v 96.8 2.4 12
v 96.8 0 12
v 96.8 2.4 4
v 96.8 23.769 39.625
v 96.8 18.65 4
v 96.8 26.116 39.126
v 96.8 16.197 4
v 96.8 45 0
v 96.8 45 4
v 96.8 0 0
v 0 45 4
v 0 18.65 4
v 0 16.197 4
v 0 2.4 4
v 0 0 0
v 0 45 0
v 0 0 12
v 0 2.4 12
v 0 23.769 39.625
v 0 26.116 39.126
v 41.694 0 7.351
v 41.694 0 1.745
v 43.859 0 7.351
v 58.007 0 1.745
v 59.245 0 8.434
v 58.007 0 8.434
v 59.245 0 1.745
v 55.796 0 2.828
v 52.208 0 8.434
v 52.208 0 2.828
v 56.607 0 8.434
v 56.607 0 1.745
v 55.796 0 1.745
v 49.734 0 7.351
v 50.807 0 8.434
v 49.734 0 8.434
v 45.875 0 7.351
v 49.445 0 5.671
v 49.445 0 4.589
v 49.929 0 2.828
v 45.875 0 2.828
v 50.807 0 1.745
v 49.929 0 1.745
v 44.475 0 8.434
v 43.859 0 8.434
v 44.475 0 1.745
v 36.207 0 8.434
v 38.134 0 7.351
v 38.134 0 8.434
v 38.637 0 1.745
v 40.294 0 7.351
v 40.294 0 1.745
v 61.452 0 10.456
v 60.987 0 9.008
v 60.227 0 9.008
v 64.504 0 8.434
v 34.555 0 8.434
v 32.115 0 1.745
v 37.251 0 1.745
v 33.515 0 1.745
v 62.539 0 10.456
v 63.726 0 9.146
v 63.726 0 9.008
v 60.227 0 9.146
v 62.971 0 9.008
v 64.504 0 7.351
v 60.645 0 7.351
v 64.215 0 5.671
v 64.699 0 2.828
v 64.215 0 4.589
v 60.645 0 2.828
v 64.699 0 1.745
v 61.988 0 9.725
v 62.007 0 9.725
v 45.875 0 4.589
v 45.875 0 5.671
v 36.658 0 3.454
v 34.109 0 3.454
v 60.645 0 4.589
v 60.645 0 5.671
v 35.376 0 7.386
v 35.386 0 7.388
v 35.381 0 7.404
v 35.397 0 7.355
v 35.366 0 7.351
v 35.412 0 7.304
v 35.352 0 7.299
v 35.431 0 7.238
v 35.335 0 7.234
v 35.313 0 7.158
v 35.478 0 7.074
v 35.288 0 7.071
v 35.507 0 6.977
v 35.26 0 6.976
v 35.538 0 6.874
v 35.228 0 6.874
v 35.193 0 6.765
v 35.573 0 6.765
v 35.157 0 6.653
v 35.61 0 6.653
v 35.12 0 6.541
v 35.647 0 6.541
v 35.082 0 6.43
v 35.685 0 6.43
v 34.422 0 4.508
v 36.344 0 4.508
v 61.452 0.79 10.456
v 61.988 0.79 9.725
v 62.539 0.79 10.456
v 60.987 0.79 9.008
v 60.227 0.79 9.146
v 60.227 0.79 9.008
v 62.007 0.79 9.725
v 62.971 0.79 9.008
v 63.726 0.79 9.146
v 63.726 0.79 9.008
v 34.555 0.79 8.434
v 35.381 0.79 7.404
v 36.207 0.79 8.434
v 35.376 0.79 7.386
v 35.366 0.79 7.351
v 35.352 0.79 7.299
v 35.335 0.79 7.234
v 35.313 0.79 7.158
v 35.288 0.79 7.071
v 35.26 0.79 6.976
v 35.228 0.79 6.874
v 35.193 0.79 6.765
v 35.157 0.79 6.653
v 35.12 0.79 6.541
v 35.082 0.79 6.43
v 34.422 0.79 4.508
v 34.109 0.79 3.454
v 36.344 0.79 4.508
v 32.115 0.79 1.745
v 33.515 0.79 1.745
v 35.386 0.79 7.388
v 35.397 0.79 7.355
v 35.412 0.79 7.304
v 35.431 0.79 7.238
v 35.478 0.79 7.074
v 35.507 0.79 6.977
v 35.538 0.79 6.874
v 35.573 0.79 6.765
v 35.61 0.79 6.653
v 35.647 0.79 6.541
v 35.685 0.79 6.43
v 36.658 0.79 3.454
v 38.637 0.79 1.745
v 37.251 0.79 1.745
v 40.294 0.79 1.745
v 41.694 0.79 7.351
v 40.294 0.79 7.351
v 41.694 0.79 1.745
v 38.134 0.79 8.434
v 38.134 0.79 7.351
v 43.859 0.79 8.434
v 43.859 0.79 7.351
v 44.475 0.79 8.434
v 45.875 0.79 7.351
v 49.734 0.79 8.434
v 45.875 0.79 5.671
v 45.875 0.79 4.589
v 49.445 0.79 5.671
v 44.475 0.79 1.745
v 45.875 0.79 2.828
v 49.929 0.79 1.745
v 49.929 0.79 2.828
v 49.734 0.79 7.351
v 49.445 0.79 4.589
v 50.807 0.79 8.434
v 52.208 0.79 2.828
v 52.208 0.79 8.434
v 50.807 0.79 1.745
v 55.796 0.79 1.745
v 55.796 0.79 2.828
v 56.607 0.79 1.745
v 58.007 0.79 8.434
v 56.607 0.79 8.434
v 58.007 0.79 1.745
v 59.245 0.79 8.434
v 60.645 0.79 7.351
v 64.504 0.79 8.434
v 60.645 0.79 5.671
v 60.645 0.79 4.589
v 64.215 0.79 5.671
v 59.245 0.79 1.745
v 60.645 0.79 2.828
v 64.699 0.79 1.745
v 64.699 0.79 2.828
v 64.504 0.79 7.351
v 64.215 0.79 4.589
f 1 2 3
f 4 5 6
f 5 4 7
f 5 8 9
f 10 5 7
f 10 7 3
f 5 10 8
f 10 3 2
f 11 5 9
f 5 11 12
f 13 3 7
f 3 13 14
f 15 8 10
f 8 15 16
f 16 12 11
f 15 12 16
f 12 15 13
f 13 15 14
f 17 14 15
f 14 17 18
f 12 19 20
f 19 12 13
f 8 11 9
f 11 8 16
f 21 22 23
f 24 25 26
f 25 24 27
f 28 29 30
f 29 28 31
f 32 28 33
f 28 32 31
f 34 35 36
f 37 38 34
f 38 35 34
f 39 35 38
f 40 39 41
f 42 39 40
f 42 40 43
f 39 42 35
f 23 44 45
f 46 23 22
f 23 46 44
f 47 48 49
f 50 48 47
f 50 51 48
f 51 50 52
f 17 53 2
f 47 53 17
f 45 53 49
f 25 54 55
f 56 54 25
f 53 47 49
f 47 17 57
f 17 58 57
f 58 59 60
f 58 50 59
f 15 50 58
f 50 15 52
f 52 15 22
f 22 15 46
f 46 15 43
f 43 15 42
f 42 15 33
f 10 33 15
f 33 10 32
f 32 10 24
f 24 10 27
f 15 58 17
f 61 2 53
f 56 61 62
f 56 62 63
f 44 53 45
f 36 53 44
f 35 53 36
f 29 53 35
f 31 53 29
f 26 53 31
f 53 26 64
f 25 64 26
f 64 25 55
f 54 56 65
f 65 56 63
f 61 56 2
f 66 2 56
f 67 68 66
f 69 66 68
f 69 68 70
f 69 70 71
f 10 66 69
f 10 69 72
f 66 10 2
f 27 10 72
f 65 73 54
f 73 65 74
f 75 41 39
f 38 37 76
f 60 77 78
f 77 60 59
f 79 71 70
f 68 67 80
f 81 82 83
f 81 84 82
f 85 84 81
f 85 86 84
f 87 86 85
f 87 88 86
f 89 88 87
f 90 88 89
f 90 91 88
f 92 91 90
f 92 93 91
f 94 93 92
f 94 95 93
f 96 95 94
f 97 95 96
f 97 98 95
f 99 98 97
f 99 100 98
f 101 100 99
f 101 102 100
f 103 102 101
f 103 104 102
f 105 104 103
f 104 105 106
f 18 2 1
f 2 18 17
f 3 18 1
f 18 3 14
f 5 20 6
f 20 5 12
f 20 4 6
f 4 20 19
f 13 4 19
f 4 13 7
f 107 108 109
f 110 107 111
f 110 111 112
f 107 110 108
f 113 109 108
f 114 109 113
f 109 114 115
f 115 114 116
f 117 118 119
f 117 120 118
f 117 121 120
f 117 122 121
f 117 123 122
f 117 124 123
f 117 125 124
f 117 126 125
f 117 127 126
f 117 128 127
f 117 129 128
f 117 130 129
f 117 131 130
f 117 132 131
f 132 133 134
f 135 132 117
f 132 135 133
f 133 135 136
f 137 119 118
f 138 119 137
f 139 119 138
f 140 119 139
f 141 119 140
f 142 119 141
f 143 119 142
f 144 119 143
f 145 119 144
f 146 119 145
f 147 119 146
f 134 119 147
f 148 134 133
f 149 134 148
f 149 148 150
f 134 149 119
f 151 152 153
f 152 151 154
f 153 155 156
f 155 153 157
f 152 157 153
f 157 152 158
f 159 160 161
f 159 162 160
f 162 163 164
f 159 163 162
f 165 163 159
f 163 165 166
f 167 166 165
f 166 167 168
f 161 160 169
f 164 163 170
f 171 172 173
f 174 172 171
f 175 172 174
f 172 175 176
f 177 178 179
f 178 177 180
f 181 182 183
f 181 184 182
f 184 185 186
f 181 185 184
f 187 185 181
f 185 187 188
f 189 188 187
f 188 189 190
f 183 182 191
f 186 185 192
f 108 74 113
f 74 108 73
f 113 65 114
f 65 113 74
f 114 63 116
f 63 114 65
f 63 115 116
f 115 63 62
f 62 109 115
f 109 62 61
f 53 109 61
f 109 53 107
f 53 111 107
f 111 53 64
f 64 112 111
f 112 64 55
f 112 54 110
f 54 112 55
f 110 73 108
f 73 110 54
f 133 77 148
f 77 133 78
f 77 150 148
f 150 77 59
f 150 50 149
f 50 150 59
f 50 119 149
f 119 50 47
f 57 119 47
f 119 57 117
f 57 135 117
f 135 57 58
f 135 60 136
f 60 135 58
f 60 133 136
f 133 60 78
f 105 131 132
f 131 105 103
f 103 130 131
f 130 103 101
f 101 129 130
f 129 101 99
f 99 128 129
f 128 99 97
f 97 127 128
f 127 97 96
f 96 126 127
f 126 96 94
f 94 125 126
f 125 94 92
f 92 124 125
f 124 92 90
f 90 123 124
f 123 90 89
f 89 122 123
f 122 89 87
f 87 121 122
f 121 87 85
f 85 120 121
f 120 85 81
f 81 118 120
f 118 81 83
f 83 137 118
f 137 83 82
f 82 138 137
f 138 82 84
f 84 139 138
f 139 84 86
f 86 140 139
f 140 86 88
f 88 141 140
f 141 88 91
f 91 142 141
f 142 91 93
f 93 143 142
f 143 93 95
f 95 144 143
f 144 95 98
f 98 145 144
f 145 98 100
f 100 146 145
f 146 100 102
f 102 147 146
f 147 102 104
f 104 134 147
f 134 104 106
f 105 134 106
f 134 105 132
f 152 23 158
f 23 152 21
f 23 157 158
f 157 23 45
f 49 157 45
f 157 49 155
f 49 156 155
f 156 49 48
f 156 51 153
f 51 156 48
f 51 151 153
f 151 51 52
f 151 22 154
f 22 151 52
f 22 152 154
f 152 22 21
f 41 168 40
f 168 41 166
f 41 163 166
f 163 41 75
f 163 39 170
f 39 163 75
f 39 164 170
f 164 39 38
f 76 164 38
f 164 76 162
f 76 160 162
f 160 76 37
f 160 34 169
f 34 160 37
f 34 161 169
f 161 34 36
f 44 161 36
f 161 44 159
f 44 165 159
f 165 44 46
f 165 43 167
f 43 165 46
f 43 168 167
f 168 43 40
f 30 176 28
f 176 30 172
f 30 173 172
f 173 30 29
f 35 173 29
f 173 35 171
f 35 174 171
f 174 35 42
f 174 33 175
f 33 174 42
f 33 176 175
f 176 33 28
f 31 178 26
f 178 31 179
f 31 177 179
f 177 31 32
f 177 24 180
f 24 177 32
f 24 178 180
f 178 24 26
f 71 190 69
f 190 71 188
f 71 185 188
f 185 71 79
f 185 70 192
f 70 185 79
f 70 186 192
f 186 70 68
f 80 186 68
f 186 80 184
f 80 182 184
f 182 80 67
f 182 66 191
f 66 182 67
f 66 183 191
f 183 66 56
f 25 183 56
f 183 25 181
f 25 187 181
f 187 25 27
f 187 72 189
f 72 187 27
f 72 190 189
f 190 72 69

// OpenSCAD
// Porta-cartão de mesa - impressão 3D
card_w = 90;         // largura do cartão (mm)
card_h = 50;         // altura do cartão (mm)
stack = 12;          // espessura da pilha de cartões (mm)
wall = 2.4;          // espessura das paredes (mm)
clearance = 1;       // folga para os cartões (mm)
tilt = 12;           // inclinação do encosto (graus)
base_d = 45;         // profundidade da base (mm)
base_h = 4;          // altura da base (mm)
lip_h = 12;          // altura da aba da frente (mm)
back_h = 40;         // altura do encosto (mm)
word = "ATELIÊ";     // texto gravado
font_size = 7;       // altura da letra (mm)
engrave = 0.8;       // profundidade da gravação (mm)

body_w = card_w + 2 * clearance + 2 * wall;
pocket = stack + clearance;

difference() {
    union() {
        cube([body_w, base_d, base_h]);
        cube([body_w, wall, lip_h]);
        translate([0, wall + pocket + wall, 0])
            rotate([-tilt, 0, 0])
                translate([0, -wall, 0])
                      cube([body_w, wall, back_h]);
    }
    translate([body_w / 2, -0.01, lip_h / 2])
        rotate([90, 0, 0])
            translate([0, 0, -engrave])
                linear_extrude(engrave + 0.01)
                    text(word, size = font_size, font = "Liberation Sans:style=Bold",
                         halign = "center", valign = "center");
}

echo(str("Largura: ", body_w, " mm"));
echo(str("Profundidade: ", base_d, " mm"));
echo(str("Altura: ", back_h * cos(tilt), " mm"));
